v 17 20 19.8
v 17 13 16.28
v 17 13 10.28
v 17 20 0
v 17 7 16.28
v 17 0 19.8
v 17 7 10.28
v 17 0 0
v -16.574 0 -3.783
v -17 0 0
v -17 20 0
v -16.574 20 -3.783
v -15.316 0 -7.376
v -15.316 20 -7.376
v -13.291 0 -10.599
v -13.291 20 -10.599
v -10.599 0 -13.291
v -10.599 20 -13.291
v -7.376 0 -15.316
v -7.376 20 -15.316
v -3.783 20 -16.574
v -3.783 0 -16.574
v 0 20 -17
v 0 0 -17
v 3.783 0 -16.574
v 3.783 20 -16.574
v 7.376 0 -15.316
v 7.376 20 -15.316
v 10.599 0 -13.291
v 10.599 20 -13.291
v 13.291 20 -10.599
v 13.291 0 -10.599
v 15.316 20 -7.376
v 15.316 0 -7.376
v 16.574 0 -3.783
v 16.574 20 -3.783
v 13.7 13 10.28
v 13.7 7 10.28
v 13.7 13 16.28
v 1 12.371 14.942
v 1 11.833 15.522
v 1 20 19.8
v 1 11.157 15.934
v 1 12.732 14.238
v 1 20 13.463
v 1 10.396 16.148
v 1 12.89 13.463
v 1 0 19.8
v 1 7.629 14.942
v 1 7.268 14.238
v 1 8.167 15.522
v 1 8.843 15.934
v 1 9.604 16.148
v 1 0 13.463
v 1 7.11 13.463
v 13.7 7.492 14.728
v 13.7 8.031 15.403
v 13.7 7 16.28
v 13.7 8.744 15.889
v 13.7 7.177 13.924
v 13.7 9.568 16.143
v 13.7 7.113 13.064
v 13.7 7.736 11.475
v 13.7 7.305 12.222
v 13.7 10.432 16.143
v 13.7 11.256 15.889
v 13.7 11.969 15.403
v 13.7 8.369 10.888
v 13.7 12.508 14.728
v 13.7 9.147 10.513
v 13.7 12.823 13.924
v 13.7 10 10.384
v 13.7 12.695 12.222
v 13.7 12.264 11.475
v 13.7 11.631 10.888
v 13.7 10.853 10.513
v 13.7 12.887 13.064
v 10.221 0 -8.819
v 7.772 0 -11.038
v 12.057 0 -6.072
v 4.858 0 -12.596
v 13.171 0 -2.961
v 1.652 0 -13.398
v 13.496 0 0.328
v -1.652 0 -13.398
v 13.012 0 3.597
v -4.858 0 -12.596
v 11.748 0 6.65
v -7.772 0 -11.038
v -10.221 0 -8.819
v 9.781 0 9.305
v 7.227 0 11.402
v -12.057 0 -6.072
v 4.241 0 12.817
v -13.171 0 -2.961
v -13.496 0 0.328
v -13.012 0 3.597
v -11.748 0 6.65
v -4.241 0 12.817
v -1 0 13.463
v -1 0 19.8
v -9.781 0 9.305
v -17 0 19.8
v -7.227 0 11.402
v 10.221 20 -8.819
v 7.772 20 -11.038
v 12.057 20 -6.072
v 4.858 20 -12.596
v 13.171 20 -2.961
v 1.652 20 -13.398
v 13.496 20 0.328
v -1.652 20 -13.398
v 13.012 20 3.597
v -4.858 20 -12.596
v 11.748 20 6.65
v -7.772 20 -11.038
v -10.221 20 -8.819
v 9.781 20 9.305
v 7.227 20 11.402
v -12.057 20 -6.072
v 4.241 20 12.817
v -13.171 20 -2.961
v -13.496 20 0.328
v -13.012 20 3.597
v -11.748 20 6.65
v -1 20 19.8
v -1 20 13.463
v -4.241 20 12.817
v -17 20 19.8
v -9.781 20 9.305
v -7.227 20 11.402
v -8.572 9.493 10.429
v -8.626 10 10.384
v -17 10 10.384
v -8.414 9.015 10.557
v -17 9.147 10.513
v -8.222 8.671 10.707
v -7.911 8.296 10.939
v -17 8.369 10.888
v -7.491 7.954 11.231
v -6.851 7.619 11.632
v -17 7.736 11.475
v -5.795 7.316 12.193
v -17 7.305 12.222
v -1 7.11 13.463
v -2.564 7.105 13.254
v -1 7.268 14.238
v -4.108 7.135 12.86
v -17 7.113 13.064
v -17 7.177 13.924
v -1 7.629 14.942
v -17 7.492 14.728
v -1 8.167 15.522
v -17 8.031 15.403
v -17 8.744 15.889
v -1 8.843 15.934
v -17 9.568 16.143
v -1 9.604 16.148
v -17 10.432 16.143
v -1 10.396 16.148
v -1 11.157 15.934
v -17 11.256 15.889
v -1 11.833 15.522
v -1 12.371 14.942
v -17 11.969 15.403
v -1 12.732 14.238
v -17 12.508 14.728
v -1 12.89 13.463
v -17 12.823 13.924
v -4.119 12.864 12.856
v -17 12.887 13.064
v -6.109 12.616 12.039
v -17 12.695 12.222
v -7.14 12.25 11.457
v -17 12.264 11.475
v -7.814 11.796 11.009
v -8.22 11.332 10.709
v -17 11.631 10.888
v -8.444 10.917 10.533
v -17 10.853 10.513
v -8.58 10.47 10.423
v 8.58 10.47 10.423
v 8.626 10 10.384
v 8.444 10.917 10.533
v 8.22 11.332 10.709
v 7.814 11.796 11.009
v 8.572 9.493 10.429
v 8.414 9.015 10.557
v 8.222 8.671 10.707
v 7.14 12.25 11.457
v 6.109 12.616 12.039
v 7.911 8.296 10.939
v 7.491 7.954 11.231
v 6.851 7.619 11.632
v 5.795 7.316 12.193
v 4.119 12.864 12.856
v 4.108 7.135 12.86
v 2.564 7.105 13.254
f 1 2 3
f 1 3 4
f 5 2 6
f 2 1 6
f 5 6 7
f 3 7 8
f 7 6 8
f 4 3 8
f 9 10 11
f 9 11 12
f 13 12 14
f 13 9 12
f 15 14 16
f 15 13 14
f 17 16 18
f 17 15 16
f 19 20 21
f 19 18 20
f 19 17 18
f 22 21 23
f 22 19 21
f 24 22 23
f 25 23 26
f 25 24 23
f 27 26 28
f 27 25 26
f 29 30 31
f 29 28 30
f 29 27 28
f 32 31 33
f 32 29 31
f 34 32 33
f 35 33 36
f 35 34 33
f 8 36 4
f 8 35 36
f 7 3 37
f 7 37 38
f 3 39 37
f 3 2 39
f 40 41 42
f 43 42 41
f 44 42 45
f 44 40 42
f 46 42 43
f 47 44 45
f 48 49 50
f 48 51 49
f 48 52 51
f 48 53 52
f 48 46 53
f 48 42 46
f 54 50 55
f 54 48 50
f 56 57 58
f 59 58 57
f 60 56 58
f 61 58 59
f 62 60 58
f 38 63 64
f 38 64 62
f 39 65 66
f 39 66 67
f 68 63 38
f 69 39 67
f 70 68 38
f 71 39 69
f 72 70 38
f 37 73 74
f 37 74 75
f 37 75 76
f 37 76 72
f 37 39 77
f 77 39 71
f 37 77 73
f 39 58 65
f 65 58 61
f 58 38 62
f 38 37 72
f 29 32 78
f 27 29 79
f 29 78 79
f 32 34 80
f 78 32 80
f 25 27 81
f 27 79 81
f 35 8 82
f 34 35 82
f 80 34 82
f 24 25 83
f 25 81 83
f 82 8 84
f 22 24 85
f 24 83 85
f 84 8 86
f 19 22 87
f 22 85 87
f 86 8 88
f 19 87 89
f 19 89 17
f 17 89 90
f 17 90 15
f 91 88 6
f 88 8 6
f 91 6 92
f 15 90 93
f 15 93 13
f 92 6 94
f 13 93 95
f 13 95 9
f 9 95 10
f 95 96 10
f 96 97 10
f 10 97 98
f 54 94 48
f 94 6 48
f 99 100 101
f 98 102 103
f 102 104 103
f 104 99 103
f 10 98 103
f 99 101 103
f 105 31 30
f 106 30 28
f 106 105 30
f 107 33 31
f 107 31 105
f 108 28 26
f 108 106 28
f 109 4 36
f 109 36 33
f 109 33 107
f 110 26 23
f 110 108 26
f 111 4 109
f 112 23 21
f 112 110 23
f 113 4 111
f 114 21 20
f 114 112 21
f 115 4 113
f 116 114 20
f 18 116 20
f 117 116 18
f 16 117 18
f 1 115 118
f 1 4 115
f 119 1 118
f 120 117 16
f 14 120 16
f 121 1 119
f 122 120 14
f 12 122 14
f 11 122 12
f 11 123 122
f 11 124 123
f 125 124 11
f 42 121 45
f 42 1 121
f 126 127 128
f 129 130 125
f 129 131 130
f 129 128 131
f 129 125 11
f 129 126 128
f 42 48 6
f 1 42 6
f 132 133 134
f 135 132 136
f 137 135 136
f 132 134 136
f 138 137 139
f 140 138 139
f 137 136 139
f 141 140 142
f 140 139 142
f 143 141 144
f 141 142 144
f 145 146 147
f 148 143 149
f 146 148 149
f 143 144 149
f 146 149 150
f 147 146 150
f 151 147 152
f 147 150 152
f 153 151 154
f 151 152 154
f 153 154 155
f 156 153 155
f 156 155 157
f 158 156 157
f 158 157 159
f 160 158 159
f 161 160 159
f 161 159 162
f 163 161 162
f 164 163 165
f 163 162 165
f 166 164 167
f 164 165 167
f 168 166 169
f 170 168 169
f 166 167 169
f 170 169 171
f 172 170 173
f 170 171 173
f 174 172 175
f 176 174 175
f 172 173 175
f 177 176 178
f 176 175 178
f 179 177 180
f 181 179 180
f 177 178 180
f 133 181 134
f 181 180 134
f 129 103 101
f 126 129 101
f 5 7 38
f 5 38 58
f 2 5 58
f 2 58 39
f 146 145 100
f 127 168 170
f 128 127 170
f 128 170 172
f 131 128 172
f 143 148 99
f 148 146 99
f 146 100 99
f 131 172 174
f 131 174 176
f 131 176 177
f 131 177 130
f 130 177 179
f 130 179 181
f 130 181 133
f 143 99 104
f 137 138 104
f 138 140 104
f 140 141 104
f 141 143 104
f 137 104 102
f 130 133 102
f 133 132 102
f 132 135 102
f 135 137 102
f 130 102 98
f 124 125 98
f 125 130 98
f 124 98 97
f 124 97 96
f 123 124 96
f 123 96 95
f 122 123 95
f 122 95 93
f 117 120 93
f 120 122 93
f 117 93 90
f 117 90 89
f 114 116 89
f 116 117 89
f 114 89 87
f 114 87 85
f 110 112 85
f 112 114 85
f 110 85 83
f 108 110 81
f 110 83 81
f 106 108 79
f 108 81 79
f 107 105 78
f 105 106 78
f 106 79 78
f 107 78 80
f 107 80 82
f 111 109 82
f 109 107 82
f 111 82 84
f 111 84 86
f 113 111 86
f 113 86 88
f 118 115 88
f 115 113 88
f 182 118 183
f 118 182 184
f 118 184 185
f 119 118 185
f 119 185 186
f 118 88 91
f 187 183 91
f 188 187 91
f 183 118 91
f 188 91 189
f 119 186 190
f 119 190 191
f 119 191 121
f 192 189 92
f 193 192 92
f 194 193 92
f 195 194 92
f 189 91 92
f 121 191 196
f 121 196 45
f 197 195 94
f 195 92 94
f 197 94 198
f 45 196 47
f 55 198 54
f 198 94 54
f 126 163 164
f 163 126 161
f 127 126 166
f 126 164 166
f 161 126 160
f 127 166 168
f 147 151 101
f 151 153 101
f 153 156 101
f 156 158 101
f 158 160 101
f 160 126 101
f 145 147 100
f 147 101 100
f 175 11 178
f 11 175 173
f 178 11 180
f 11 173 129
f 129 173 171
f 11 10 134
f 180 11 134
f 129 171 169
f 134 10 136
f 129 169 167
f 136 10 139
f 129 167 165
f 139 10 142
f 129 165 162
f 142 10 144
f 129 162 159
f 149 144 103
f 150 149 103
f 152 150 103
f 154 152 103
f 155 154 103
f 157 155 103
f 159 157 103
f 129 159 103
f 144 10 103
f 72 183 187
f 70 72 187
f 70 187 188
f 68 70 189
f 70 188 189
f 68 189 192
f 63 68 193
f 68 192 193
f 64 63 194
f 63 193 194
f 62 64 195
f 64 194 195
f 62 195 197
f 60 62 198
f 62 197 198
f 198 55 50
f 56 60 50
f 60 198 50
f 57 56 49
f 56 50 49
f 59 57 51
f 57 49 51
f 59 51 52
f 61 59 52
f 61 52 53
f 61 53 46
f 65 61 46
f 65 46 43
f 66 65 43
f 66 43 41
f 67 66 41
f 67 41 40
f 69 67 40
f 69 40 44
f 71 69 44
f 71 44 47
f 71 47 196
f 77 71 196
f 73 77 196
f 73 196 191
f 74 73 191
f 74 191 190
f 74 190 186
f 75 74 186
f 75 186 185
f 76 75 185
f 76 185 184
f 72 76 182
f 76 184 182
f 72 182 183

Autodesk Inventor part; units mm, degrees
ref_plane "YZ Plane" through (0, 0, 0) normal (1, 0, 0) x (0, 1, 0)
ref_plane "XZ Plane" through (0, 0, 0) normal (0, 1, 0) x (-1, 0, 0)
ref_plane "XY Plane" through (0, 0, 0) normal (0, 0, 1) x (1, 0, 0)
sketch "Sketch1" plane through (0, 0, 0) normal (0, 1, 0) x (-1, 0, 0)
  arc A0 (-1, 13.4629) -> (1, 13.4629) centre (0, 0) ccw
  arc A1 (-17, 0) -> (17, 0) centre (0, 0) ccw
  line L0 (17, 0) -> (17, 19.8)
  line L1 (-17, 19.8) -> (-17, 0)
  line L2 (-1, 19.8) -> (-1, 13.4629)
  line L3 (1, 19.8) -> (1, 13.4629)
  line L4 (17, 19.8) -> (1, 19.8)
  line L5 (-1, 19.8) -> (-17, 19.8)
  dimension "d0" = 27
  dimension "d1" = 34
extrude "Extrusion1" add sketch "Sketch1" along normal blind 20
sketch "Sketch2" plane through (17, 0, 19.8) normal (1, 0, 0) x (0, 0, -1)
  line L0 (0, 0) -> (0, 20) projected
  line L1 (3.52, 13) -> (9.52, 13)
  line L2 (9.52, 13) -> (9.52, 7)
  line L3 (9.52, 7) -> (3.52, 7)
  line L4 (3.52, 7) -> (3.52, 13)
  line L5 (3.52, 13) -> (9.52, 7) construction
  line L6 (9.52, 13) -> (3.52, 7) construction
  point P0 (6.52, 10)
  dimension "d7" = 6.52
  dimension "d15" = 6
  dimension "d16" = 6
hole "Hole1" at (17, 10, 13.28) direction (-1, 0, 0) diameter 5.791 end through all clearance for "Flat Head Machine Screw (82)" size "#12" standard "Ansi Unified Screw Threads"
extrude "Extrusion2" cut sketch "Sketch2" against normal blind 3.3
properties part number "slik_clamp_head38_collar"
